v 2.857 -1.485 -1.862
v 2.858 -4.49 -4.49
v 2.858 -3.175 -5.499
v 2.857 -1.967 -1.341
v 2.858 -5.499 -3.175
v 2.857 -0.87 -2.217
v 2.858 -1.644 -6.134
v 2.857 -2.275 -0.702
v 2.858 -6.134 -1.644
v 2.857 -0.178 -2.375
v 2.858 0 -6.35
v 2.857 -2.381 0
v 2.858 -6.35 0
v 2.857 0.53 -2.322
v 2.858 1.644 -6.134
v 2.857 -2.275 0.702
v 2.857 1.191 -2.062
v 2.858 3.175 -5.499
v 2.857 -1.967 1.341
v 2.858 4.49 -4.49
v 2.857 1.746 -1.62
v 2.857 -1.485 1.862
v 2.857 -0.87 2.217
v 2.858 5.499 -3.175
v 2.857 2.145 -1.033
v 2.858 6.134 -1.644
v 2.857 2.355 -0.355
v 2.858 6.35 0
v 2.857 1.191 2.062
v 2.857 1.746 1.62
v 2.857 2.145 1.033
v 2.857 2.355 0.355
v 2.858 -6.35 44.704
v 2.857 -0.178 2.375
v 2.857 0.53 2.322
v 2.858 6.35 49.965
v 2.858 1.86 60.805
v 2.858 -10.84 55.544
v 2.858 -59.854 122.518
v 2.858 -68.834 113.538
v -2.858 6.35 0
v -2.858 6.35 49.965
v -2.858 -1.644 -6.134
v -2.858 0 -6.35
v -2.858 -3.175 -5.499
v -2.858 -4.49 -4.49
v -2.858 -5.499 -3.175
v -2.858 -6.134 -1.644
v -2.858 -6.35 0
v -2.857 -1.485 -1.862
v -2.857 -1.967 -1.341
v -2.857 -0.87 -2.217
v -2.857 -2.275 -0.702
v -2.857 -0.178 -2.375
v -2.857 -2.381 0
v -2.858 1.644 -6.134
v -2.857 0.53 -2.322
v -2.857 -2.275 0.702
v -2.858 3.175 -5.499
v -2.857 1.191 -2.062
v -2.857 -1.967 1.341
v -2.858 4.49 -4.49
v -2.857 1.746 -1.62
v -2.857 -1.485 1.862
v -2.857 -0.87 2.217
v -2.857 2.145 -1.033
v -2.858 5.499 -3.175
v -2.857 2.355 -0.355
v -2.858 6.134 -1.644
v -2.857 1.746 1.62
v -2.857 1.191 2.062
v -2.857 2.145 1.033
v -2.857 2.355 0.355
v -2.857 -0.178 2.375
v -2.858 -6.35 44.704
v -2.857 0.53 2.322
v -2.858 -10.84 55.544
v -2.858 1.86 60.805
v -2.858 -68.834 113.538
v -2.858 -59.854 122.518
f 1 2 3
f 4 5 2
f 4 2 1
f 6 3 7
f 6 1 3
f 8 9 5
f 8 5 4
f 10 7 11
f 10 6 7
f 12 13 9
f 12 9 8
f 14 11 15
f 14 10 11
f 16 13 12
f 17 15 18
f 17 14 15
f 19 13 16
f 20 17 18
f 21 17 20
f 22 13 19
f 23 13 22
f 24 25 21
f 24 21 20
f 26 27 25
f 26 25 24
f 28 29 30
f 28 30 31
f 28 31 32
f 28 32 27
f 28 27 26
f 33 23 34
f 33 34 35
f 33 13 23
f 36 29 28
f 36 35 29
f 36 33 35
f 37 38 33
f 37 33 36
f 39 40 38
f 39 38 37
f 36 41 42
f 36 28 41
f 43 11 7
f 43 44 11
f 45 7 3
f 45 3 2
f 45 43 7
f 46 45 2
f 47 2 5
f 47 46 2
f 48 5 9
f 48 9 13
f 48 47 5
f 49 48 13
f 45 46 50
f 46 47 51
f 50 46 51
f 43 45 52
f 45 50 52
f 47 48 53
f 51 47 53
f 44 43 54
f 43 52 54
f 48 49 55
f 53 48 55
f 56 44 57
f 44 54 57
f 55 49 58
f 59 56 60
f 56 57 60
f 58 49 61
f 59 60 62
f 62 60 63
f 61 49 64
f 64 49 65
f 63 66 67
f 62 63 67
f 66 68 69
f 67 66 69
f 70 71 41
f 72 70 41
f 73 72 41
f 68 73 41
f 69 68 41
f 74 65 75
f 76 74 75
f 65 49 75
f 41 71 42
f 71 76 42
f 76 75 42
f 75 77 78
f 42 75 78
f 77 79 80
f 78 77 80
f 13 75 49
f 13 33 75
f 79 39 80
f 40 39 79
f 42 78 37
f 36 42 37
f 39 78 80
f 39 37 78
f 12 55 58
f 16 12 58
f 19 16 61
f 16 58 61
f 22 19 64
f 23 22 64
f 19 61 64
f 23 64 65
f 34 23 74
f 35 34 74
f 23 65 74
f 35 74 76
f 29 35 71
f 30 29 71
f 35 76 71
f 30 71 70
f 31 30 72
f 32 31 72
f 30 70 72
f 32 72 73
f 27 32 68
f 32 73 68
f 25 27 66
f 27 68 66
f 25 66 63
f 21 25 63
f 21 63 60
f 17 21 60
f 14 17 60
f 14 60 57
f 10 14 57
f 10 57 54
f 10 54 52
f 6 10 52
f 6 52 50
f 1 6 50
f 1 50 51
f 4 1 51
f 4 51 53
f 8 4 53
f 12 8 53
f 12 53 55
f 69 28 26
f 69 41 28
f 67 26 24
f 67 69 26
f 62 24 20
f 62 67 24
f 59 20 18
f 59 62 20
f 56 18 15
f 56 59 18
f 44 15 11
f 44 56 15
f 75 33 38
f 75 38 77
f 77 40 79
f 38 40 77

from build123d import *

# Parameters (mm, degrees)
F1_DEPTH = 2.8575
F3_D     = 4.7625
F4_R     = 6.34999
F5_SIZE  = 6.35


# Not quite as in the source:
# - a fillet or chamfer is up to 0.001 mm smaller than in the source, because OpenCascade refuses the exact size


with BuildPart() as f1:
    # F0 (on Right) → F1 (new body, symmetric)
    with BuildSketch(Plane.YZ):
        Polygon((6.35, -6.35), (6.35, 56.3145122421), (-59.8537438789, 122.5182561211), (-68.834, 113.538), (-6.35, 51.054), (-6.35, -6.35), align=None)
    extrude(amount=F1_DEPTH, both=True)

    # F3 (through all)
    with Locations(Plane.YZ.offset(2.8575)):
        with Locations((0, 0)):
            Hole(F3_D / 2)

    # F4 (radius 6.35 in the source; OpenCascade refuses exactly that, so slightly less here)
    f4_edges = [f1.edges().sort_by_distance(p)[0] for p in [
        (0, -6.35, -6.35),
        (0, 6.35, -6.35),
    ]]
    fillet(f4_edges, radius=F4_R)

    # F5
    f5_edges = [f1.edges().sort_by_distance(p)[0] for p in [
        (0, -6.35, 51.054),
        (0, 6.35, 56.314512),
    ]]
    chamfer(f5_edges, length=F5_SIZE)


solid = f1.part
